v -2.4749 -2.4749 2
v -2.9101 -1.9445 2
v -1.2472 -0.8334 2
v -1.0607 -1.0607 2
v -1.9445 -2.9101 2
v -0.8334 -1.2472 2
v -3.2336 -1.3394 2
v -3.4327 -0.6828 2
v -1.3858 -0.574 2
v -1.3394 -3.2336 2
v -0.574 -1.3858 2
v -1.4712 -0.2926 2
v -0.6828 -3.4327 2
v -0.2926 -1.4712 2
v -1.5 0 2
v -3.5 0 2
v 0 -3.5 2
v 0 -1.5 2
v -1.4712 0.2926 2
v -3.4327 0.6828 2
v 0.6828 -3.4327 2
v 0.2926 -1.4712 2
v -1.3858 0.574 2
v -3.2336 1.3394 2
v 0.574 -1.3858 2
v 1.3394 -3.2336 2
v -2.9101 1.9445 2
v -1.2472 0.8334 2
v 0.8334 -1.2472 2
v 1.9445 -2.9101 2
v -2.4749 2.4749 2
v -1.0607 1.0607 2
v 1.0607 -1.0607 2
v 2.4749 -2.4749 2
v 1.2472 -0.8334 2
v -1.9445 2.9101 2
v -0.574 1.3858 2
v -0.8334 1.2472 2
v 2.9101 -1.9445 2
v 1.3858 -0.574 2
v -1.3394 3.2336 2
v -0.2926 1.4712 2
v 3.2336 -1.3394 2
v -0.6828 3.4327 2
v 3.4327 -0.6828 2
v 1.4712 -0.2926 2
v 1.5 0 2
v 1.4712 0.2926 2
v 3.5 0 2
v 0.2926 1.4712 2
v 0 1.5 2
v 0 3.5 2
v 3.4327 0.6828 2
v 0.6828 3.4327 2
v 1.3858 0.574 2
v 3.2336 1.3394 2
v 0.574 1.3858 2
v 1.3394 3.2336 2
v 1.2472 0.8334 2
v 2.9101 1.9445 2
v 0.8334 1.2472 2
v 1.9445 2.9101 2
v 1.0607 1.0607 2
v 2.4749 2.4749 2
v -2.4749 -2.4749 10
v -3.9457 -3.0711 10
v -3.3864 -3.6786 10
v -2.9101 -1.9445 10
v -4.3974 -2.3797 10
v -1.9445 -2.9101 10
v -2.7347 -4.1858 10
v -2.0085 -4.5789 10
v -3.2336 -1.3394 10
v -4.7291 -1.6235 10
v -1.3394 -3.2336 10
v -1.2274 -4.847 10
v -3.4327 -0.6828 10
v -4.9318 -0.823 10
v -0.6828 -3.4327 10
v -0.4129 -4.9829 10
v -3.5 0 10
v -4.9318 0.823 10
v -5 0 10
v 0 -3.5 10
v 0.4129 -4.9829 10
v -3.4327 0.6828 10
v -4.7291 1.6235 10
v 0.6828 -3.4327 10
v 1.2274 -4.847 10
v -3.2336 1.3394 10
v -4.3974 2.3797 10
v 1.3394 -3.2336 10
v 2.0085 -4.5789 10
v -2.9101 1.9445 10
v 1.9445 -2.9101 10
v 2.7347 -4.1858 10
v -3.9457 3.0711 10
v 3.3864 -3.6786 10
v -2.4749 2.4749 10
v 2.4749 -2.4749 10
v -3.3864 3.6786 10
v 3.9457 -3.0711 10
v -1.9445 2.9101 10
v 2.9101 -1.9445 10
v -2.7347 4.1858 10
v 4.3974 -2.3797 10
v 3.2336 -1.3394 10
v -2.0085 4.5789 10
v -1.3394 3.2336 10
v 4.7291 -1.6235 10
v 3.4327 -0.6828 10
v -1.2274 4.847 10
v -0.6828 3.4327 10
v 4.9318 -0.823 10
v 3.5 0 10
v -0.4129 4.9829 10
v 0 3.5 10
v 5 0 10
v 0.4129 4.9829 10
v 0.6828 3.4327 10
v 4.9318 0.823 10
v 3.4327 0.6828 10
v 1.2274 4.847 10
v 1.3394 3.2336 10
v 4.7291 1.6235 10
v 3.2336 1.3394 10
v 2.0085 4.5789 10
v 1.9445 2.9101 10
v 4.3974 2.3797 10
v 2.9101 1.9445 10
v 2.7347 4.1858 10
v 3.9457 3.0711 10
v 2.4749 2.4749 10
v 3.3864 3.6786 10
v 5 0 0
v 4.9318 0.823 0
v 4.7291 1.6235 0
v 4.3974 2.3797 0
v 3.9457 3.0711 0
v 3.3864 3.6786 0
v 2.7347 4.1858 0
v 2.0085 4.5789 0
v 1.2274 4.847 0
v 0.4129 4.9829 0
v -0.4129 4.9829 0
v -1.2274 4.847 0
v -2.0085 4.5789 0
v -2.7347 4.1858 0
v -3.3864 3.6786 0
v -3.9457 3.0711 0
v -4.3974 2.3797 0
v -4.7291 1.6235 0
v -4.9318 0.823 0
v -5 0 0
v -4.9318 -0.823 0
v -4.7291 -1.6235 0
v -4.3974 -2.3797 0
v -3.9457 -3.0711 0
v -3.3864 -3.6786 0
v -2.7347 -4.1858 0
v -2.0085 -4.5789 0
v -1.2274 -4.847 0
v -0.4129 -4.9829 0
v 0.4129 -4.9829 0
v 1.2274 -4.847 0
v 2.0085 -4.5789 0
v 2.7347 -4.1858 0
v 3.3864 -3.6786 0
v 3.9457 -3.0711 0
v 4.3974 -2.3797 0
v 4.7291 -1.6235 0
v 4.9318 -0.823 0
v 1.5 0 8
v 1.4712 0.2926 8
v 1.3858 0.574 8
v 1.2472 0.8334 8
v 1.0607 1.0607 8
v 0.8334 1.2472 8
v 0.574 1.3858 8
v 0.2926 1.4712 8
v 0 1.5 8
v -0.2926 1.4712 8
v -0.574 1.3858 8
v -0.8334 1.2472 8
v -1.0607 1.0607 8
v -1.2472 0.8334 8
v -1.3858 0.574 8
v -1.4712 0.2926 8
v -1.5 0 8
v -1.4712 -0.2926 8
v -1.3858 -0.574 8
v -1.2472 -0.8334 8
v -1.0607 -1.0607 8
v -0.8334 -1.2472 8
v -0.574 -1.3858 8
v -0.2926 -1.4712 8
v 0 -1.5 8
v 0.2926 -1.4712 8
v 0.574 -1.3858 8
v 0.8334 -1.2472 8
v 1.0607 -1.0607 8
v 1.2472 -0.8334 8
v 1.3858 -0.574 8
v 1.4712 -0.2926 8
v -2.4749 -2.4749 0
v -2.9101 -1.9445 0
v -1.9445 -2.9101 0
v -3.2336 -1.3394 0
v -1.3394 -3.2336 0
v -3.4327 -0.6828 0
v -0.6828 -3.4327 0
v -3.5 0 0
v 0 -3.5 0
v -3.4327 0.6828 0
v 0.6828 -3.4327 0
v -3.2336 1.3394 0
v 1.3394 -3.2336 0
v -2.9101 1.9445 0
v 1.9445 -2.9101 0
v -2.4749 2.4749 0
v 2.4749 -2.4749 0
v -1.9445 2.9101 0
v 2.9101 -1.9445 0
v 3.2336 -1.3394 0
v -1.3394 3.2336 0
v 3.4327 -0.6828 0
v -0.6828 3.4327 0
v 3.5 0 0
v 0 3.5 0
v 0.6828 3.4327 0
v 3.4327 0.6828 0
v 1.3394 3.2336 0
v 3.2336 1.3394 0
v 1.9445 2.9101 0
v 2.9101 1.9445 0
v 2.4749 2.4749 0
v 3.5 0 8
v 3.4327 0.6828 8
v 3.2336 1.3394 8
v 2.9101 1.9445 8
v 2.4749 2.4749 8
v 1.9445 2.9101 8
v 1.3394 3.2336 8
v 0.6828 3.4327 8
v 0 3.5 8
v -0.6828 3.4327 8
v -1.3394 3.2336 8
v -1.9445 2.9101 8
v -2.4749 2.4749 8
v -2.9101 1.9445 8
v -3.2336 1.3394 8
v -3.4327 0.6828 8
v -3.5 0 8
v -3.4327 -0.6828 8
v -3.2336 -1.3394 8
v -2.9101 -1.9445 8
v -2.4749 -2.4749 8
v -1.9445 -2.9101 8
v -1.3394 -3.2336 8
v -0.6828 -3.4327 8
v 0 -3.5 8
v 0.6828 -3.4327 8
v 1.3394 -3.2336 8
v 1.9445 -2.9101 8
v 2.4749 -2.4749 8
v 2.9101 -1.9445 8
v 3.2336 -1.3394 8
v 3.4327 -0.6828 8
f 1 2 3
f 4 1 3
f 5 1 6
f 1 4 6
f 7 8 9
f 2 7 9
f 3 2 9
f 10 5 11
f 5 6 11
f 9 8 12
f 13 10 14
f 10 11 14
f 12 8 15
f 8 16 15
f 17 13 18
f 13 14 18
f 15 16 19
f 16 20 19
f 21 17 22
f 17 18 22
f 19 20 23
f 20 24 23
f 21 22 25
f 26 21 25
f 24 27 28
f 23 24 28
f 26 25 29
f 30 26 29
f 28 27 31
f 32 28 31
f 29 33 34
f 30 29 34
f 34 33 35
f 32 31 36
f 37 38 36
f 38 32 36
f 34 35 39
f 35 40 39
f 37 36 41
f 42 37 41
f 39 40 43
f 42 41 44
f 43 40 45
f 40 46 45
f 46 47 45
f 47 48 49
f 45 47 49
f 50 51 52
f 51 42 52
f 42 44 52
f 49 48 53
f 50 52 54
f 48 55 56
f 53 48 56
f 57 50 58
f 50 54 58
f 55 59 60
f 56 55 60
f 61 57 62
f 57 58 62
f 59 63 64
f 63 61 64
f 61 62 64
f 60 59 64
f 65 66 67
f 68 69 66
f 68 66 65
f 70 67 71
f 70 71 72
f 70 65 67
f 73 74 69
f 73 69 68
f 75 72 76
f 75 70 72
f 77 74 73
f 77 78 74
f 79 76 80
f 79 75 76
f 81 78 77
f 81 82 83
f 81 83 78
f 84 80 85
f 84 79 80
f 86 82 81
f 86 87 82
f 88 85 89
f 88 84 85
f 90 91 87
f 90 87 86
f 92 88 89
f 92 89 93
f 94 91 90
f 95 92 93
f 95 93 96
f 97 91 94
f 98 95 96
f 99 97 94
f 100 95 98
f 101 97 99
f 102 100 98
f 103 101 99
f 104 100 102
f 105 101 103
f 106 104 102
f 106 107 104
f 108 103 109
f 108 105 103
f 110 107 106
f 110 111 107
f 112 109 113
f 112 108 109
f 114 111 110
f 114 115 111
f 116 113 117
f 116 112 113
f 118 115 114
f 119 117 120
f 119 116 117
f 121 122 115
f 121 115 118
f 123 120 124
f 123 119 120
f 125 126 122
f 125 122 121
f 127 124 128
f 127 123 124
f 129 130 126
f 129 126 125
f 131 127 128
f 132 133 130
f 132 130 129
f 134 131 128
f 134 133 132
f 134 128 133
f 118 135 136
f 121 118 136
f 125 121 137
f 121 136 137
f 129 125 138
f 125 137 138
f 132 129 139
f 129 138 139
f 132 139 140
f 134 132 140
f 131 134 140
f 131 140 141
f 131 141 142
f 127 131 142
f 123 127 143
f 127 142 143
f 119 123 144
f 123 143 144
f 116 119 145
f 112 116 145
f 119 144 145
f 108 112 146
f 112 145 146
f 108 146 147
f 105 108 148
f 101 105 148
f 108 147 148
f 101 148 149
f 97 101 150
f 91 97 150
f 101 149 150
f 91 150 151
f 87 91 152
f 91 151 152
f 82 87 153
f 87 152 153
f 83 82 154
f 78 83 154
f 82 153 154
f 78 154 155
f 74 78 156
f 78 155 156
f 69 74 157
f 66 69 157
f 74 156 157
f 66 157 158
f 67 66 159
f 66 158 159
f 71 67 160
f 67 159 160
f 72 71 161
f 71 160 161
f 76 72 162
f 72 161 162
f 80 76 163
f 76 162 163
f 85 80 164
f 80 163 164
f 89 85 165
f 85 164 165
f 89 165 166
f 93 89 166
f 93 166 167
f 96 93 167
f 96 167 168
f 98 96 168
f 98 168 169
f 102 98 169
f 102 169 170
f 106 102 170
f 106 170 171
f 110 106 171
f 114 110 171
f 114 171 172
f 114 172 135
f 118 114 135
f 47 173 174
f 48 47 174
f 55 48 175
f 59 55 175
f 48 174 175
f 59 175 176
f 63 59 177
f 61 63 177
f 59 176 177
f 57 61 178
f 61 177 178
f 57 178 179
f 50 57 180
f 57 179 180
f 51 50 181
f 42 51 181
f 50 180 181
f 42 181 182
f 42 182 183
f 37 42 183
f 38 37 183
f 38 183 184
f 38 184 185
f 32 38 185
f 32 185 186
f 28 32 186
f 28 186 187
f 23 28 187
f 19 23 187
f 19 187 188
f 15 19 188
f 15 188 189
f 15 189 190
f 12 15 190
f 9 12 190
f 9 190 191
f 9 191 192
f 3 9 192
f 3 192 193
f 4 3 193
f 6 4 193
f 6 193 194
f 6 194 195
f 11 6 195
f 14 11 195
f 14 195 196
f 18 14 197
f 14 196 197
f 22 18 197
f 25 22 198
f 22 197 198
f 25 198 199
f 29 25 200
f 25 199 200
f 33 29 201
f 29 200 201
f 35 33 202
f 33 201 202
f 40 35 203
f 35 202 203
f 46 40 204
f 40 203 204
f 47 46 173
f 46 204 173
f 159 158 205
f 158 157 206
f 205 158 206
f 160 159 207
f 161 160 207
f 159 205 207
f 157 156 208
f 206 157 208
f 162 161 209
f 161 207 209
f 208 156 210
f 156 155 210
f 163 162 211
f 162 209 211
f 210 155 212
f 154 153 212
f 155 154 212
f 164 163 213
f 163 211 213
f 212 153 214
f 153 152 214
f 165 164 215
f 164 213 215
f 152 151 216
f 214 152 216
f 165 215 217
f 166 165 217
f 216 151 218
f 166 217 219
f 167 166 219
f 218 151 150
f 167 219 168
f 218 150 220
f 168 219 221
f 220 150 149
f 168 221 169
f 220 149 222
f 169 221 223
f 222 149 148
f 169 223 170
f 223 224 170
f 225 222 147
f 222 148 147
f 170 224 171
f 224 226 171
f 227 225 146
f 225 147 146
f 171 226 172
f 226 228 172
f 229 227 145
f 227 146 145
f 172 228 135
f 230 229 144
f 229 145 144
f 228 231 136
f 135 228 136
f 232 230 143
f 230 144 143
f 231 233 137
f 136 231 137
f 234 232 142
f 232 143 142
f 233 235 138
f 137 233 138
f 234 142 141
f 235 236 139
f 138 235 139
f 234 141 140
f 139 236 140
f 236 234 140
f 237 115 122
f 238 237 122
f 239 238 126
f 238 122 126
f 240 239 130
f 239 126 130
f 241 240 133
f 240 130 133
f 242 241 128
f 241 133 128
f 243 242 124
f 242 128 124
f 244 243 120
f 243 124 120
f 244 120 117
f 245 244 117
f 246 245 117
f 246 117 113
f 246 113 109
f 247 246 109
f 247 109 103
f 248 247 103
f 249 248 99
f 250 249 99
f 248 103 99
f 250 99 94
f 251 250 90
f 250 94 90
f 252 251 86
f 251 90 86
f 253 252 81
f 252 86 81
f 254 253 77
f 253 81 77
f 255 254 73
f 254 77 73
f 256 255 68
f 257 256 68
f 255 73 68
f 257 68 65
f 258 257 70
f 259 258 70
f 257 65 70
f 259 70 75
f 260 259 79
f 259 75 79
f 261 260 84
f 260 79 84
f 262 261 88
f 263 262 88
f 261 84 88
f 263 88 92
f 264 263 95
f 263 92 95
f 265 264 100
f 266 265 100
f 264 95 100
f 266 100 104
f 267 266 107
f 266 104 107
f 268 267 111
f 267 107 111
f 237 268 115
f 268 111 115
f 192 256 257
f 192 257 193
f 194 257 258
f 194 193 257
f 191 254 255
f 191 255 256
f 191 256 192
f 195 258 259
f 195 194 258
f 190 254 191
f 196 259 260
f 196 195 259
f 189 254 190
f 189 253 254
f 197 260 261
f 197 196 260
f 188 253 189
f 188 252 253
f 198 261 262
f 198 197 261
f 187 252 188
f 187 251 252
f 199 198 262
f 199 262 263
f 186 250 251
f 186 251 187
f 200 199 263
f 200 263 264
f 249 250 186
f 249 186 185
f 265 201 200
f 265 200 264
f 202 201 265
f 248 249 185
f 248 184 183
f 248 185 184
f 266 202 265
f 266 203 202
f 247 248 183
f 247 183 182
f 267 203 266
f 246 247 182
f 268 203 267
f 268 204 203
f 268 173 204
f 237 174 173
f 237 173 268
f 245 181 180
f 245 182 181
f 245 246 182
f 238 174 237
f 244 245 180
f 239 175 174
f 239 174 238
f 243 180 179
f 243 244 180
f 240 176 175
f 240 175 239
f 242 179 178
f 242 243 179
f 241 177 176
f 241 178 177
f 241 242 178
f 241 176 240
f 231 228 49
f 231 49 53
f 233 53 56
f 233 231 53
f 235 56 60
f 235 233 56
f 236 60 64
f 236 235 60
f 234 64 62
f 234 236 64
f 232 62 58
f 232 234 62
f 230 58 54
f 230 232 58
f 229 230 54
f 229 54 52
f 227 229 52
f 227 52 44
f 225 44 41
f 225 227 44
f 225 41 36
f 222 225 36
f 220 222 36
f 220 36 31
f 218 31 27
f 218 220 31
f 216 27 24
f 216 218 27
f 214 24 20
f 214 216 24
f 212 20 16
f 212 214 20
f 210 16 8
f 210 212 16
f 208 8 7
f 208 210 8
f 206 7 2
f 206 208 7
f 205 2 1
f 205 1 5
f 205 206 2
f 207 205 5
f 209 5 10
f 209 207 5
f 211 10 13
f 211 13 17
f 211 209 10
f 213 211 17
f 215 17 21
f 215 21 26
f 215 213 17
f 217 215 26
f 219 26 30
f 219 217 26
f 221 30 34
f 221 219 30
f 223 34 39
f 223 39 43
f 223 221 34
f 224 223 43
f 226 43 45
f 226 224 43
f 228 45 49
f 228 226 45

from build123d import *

# Parameters (mm, degrees)
SKETCH1_R           = 5
BOSS_EXTRUDE1_DEPTH = 10
SKETCH2_R           = 3.5
CUT_EXTRUDE1_DEPTH  = 2
SKETCH3_R           = 3.5
CUT_EXTRUDE2_DEPTH  = 2
SKETCH4_R           = 1.5
CUT_EXTRUDE3_DEPTH  = 12


with BuildPart() as part:
    # Sketch1 → Boss-Extrude1 (new body)
    with BuildSketch(Plane.XY):
        Circle(SKETCH1_R)
    extrude(amount=BOSS_EXTRUDE1_DEPTH)

    # Sketch2 → Cut-Extrude1 (cut)
    with BuildSketch(Plane.XY):
        Circle(SKETCH2_R)
    extrude(amount=CUT_EXTRUDE1_DEPTH, mode=Mode.SUBTRACT)

    # Sketch3 → Cut-Extrude2 (cut)
    with BuildSketch(Plane.XY.offset(10)):
        Circle(SKETCH3_R)
    extrude(amount=-CUT_EXTRUDE2_DEPTH, mode=Mode.SUBTRACT)

    # Sketch4 → Cut-Extrude3 (cut)
    with BuildSketch(Plane.XY.offset(10)):
        Circle(SKETCH4_R)
    extrude(amount=-CUT_EXTRUDE3_DEPTH, mode=Mode.SUBTRACT)


solid = part.part
